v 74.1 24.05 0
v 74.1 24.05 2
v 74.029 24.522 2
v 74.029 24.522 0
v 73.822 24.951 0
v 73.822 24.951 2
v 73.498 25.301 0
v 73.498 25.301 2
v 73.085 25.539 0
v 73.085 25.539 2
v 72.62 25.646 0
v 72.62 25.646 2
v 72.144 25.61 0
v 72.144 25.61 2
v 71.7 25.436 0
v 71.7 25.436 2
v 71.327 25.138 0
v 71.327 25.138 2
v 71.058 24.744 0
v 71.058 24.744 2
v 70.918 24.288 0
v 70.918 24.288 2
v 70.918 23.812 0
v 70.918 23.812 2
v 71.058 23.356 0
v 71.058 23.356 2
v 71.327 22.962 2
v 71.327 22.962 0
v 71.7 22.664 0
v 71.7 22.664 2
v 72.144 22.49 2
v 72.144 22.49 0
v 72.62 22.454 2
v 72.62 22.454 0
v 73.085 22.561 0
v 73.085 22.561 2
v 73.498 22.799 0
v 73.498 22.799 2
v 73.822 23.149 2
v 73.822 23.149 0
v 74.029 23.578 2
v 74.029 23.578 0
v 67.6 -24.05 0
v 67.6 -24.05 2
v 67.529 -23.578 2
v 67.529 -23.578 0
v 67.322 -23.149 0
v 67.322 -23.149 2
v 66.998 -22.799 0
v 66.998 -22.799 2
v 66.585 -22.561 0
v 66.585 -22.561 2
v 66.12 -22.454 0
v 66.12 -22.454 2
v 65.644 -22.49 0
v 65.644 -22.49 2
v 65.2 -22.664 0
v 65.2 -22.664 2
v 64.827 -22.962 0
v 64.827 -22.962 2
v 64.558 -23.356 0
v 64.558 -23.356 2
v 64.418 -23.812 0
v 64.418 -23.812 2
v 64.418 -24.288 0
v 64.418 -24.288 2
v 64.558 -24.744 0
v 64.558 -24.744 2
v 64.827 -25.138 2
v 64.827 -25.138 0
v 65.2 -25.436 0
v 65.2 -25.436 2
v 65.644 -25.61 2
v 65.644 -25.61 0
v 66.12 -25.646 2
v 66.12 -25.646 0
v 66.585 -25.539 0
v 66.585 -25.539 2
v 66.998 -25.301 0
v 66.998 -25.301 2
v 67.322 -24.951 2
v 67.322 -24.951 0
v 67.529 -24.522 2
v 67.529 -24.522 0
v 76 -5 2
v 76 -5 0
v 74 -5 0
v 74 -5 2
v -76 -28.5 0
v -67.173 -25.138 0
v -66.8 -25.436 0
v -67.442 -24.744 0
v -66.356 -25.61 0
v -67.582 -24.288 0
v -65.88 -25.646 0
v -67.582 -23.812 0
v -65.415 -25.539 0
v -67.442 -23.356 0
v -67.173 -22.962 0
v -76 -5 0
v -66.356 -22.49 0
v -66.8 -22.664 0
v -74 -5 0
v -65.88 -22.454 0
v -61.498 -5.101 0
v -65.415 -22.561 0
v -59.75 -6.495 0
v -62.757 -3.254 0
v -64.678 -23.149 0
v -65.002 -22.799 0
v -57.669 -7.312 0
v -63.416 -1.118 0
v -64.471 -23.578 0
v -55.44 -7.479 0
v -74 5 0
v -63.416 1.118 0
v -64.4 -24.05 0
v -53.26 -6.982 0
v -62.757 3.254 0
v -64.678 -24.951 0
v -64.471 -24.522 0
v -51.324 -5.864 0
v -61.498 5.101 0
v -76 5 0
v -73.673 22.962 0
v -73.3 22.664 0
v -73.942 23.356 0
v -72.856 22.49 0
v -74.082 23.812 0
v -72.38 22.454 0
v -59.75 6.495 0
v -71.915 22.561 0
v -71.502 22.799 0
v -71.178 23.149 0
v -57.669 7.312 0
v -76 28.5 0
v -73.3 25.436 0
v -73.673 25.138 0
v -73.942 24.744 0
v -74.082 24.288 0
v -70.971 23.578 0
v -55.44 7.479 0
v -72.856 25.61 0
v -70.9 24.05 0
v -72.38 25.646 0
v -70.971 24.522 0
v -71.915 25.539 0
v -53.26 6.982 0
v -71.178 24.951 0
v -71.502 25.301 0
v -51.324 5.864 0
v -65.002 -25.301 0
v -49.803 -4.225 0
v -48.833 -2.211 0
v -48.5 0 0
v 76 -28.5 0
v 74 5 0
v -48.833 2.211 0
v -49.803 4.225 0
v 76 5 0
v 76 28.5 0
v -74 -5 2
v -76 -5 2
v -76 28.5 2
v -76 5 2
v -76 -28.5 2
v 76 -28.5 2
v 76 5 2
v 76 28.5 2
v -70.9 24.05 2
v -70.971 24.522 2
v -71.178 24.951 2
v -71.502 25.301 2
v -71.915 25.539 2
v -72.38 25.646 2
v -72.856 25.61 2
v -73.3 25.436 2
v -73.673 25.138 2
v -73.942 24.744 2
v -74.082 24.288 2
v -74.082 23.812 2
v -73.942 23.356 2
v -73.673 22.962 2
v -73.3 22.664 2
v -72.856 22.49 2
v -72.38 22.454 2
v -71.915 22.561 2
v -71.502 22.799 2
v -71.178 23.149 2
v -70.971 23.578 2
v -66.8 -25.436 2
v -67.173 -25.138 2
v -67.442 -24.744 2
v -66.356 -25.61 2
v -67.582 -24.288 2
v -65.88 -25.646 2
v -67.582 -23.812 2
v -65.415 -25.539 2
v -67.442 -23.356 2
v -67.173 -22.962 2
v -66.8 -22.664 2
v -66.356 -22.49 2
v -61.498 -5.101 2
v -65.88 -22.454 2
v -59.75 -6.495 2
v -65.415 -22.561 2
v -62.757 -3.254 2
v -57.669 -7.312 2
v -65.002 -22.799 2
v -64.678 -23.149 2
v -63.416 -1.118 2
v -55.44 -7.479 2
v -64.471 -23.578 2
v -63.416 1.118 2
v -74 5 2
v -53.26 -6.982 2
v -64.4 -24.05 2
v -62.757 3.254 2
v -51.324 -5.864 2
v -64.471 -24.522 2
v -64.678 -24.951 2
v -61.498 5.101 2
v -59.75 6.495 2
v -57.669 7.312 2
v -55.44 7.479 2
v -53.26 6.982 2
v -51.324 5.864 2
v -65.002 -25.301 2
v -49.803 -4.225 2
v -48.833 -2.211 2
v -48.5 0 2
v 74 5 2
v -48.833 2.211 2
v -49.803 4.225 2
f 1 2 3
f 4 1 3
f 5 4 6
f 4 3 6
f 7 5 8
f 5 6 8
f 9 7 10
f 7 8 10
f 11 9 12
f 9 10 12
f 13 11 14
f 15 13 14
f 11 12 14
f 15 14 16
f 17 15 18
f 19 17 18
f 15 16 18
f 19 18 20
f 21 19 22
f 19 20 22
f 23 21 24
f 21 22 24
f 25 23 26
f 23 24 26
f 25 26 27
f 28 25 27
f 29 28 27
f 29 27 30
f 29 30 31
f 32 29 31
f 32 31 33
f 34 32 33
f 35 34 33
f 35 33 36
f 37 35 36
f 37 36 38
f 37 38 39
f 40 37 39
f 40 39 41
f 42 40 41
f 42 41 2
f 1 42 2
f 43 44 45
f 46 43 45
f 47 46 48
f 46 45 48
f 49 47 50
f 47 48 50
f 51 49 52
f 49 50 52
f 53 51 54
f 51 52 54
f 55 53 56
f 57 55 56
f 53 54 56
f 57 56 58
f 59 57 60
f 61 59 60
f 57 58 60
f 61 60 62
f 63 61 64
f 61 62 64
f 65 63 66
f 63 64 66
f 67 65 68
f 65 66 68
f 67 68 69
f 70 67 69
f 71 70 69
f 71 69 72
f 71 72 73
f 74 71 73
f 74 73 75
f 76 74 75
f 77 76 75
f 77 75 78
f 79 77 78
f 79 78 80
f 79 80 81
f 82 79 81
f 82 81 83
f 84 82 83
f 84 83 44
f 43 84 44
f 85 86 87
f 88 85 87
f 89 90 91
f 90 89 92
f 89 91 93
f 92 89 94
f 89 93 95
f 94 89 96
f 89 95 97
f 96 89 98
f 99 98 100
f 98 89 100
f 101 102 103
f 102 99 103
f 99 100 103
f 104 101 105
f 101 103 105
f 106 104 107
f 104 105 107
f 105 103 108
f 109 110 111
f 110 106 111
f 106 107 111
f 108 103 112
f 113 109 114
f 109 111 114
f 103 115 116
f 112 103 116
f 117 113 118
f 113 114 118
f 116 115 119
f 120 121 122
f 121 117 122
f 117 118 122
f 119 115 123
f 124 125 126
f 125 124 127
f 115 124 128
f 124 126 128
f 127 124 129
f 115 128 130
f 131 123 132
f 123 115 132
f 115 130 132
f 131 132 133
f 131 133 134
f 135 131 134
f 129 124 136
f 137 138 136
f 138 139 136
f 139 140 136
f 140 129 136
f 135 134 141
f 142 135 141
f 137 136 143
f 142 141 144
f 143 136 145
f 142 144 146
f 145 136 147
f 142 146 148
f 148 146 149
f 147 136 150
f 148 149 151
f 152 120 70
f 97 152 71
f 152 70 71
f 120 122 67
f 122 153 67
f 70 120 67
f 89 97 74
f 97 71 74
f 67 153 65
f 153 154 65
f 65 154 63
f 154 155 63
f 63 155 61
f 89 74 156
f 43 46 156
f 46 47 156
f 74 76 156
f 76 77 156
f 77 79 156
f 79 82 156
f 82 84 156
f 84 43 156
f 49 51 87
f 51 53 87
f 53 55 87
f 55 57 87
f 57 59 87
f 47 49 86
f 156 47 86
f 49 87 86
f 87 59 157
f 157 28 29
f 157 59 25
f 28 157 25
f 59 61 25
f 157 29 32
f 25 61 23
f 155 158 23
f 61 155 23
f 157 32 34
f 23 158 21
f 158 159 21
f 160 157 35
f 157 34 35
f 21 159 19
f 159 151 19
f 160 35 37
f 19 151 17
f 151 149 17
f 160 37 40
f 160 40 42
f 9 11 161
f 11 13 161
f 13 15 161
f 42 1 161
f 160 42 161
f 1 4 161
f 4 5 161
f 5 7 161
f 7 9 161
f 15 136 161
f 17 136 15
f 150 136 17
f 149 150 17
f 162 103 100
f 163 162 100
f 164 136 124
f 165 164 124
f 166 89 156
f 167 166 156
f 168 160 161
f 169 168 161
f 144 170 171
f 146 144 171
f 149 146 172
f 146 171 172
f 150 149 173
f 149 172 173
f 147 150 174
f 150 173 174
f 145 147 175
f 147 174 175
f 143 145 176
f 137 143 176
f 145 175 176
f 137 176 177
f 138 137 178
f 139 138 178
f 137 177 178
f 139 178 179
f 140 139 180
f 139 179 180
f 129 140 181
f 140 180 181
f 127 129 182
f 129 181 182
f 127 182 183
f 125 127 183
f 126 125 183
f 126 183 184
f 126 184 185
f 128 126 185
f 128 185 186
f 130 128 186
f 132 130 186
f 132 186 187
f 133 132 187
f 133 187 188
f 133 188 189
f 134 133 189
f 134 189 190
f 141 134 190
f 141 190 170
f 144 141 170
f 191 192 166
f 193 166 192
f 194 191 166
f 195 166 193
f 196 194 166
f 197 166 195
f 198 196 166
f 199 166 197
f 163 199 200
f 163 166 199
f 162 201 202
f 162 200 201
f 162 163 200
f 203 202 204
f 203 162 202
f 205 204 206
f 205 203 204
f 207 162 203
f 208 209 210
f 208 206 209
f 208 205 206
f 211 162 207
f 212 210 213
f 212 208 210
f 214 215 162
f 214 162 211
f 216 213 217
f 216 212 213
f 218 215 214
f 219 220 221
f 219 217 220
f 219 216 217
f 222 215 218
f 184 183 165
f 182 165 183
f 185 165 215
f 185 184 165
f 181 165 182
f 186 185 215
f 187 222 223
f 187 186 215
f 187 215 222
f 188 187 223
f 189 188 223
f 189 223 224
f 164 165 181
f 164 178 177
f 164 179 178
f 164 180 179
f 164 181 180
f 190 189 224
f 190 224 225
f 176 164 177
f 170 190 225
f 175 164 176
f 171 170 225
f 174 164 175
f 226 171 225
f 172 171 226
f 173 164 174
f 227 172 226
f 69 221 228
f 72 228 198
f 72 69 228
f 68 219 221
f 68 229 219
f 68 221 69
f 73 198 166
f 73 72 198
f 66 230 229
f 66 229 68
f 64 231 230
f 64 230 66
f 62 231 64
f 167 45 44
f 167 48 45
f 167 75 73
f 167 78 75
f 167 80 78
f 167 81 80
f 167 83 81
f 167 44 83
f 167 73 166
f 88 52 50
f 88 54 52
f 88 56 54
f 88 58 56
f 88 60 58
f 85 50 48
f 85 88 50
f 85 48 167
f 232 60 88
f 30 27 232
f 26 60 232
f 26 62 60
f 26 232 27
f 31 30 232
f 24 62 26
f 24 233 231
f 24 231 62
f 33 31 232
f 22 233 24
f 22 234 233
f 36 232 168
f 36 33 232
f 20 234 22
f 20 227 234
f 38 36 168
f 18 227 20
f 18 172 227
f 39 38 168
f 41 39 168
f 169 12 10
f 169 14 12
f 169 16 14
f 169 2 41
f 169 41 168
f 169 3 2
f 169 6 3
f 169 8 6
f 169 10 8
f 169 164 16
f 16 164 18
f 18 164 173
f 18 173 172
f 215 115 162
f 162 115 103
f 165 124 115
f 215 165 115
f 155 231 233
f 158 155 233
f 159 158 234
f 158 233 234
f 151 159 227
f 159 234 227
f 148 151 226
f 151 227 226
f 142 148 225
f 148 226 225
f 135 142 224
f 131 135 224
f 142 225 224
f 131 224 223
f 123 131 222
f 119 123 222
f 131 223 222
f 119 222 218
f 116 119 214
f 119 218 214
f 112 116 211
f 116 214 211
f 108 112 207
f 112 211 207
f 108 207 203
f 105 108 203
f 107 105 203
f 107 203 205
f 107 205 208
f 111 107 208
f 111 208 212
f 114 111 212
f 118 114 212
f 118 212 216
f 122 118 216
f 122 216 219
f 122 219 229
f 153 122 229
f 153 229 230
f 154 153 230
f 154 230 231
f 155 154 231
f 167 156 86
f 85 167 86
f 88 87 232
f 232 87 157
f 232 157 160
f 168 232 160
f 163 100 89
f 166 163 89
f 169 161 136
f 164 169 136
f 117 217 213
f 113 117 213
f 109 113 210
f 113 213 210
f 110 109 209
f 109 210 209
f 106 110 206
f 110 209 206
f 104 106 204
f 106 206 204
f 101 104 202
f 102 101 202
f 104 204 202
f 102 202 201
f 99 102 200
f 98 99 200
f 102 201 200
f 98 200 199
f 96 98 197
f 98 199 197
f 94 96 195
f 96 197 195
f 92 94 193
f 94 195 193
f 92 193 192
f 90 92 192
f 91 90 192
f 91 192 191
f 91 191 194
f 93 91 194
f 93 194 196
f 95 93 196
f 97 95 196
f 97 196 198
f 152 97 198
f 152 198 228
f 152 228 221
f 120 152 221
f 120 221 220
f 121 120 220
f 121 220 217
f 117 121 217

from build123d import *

# Parameters (mm, degrees)
BOSS_EXTRUDE1_DEPTH = 2
SKETCH2_R           = 1.6
SKETCH2_R_2         = 7.5
CUT_EXTRUDE1_DEPTH  = 82.192672083


with BuildPart() as part:
    # Sketch1 → Boss-Extrude1 (new body)
    with BuildSketch(Plane.XY):
        Polygon((76, 28.5), (-76, 28.5), (-76, 5), (-74, 5), (-74, -5), (-76, -5), (-76, -28.5), (76, -28.5), (76, -5), (74, -5), (74, 5), (76, 5), align=None)
    extrude(amount=BOSS_EXTRUDE1_DEPTH)

    # Sketch2 → Cut-Extrude1 (cut, through all)
    with BuildSketch(Plane.XY.offset(2)):
        with Locations((-72.5, 24.05)):
            Circle(SKETCH2_R)
        with Locations((72.5, 24.05)):
            Circle(SKETCH2_R)
        with Locations((66, -24.05)):
            Circle(SKETCH2_R)
        with Locations((-66, -24.05)):
            Circle(SKETCH2_R)
        with Locations((-56, 0)):
            Circle(SKETCH2_R_2)
    extrude(amount=-CUT_EXTRUDE1_DEPTH, mode=Mode.SUBTRACT)


solid = part.part
